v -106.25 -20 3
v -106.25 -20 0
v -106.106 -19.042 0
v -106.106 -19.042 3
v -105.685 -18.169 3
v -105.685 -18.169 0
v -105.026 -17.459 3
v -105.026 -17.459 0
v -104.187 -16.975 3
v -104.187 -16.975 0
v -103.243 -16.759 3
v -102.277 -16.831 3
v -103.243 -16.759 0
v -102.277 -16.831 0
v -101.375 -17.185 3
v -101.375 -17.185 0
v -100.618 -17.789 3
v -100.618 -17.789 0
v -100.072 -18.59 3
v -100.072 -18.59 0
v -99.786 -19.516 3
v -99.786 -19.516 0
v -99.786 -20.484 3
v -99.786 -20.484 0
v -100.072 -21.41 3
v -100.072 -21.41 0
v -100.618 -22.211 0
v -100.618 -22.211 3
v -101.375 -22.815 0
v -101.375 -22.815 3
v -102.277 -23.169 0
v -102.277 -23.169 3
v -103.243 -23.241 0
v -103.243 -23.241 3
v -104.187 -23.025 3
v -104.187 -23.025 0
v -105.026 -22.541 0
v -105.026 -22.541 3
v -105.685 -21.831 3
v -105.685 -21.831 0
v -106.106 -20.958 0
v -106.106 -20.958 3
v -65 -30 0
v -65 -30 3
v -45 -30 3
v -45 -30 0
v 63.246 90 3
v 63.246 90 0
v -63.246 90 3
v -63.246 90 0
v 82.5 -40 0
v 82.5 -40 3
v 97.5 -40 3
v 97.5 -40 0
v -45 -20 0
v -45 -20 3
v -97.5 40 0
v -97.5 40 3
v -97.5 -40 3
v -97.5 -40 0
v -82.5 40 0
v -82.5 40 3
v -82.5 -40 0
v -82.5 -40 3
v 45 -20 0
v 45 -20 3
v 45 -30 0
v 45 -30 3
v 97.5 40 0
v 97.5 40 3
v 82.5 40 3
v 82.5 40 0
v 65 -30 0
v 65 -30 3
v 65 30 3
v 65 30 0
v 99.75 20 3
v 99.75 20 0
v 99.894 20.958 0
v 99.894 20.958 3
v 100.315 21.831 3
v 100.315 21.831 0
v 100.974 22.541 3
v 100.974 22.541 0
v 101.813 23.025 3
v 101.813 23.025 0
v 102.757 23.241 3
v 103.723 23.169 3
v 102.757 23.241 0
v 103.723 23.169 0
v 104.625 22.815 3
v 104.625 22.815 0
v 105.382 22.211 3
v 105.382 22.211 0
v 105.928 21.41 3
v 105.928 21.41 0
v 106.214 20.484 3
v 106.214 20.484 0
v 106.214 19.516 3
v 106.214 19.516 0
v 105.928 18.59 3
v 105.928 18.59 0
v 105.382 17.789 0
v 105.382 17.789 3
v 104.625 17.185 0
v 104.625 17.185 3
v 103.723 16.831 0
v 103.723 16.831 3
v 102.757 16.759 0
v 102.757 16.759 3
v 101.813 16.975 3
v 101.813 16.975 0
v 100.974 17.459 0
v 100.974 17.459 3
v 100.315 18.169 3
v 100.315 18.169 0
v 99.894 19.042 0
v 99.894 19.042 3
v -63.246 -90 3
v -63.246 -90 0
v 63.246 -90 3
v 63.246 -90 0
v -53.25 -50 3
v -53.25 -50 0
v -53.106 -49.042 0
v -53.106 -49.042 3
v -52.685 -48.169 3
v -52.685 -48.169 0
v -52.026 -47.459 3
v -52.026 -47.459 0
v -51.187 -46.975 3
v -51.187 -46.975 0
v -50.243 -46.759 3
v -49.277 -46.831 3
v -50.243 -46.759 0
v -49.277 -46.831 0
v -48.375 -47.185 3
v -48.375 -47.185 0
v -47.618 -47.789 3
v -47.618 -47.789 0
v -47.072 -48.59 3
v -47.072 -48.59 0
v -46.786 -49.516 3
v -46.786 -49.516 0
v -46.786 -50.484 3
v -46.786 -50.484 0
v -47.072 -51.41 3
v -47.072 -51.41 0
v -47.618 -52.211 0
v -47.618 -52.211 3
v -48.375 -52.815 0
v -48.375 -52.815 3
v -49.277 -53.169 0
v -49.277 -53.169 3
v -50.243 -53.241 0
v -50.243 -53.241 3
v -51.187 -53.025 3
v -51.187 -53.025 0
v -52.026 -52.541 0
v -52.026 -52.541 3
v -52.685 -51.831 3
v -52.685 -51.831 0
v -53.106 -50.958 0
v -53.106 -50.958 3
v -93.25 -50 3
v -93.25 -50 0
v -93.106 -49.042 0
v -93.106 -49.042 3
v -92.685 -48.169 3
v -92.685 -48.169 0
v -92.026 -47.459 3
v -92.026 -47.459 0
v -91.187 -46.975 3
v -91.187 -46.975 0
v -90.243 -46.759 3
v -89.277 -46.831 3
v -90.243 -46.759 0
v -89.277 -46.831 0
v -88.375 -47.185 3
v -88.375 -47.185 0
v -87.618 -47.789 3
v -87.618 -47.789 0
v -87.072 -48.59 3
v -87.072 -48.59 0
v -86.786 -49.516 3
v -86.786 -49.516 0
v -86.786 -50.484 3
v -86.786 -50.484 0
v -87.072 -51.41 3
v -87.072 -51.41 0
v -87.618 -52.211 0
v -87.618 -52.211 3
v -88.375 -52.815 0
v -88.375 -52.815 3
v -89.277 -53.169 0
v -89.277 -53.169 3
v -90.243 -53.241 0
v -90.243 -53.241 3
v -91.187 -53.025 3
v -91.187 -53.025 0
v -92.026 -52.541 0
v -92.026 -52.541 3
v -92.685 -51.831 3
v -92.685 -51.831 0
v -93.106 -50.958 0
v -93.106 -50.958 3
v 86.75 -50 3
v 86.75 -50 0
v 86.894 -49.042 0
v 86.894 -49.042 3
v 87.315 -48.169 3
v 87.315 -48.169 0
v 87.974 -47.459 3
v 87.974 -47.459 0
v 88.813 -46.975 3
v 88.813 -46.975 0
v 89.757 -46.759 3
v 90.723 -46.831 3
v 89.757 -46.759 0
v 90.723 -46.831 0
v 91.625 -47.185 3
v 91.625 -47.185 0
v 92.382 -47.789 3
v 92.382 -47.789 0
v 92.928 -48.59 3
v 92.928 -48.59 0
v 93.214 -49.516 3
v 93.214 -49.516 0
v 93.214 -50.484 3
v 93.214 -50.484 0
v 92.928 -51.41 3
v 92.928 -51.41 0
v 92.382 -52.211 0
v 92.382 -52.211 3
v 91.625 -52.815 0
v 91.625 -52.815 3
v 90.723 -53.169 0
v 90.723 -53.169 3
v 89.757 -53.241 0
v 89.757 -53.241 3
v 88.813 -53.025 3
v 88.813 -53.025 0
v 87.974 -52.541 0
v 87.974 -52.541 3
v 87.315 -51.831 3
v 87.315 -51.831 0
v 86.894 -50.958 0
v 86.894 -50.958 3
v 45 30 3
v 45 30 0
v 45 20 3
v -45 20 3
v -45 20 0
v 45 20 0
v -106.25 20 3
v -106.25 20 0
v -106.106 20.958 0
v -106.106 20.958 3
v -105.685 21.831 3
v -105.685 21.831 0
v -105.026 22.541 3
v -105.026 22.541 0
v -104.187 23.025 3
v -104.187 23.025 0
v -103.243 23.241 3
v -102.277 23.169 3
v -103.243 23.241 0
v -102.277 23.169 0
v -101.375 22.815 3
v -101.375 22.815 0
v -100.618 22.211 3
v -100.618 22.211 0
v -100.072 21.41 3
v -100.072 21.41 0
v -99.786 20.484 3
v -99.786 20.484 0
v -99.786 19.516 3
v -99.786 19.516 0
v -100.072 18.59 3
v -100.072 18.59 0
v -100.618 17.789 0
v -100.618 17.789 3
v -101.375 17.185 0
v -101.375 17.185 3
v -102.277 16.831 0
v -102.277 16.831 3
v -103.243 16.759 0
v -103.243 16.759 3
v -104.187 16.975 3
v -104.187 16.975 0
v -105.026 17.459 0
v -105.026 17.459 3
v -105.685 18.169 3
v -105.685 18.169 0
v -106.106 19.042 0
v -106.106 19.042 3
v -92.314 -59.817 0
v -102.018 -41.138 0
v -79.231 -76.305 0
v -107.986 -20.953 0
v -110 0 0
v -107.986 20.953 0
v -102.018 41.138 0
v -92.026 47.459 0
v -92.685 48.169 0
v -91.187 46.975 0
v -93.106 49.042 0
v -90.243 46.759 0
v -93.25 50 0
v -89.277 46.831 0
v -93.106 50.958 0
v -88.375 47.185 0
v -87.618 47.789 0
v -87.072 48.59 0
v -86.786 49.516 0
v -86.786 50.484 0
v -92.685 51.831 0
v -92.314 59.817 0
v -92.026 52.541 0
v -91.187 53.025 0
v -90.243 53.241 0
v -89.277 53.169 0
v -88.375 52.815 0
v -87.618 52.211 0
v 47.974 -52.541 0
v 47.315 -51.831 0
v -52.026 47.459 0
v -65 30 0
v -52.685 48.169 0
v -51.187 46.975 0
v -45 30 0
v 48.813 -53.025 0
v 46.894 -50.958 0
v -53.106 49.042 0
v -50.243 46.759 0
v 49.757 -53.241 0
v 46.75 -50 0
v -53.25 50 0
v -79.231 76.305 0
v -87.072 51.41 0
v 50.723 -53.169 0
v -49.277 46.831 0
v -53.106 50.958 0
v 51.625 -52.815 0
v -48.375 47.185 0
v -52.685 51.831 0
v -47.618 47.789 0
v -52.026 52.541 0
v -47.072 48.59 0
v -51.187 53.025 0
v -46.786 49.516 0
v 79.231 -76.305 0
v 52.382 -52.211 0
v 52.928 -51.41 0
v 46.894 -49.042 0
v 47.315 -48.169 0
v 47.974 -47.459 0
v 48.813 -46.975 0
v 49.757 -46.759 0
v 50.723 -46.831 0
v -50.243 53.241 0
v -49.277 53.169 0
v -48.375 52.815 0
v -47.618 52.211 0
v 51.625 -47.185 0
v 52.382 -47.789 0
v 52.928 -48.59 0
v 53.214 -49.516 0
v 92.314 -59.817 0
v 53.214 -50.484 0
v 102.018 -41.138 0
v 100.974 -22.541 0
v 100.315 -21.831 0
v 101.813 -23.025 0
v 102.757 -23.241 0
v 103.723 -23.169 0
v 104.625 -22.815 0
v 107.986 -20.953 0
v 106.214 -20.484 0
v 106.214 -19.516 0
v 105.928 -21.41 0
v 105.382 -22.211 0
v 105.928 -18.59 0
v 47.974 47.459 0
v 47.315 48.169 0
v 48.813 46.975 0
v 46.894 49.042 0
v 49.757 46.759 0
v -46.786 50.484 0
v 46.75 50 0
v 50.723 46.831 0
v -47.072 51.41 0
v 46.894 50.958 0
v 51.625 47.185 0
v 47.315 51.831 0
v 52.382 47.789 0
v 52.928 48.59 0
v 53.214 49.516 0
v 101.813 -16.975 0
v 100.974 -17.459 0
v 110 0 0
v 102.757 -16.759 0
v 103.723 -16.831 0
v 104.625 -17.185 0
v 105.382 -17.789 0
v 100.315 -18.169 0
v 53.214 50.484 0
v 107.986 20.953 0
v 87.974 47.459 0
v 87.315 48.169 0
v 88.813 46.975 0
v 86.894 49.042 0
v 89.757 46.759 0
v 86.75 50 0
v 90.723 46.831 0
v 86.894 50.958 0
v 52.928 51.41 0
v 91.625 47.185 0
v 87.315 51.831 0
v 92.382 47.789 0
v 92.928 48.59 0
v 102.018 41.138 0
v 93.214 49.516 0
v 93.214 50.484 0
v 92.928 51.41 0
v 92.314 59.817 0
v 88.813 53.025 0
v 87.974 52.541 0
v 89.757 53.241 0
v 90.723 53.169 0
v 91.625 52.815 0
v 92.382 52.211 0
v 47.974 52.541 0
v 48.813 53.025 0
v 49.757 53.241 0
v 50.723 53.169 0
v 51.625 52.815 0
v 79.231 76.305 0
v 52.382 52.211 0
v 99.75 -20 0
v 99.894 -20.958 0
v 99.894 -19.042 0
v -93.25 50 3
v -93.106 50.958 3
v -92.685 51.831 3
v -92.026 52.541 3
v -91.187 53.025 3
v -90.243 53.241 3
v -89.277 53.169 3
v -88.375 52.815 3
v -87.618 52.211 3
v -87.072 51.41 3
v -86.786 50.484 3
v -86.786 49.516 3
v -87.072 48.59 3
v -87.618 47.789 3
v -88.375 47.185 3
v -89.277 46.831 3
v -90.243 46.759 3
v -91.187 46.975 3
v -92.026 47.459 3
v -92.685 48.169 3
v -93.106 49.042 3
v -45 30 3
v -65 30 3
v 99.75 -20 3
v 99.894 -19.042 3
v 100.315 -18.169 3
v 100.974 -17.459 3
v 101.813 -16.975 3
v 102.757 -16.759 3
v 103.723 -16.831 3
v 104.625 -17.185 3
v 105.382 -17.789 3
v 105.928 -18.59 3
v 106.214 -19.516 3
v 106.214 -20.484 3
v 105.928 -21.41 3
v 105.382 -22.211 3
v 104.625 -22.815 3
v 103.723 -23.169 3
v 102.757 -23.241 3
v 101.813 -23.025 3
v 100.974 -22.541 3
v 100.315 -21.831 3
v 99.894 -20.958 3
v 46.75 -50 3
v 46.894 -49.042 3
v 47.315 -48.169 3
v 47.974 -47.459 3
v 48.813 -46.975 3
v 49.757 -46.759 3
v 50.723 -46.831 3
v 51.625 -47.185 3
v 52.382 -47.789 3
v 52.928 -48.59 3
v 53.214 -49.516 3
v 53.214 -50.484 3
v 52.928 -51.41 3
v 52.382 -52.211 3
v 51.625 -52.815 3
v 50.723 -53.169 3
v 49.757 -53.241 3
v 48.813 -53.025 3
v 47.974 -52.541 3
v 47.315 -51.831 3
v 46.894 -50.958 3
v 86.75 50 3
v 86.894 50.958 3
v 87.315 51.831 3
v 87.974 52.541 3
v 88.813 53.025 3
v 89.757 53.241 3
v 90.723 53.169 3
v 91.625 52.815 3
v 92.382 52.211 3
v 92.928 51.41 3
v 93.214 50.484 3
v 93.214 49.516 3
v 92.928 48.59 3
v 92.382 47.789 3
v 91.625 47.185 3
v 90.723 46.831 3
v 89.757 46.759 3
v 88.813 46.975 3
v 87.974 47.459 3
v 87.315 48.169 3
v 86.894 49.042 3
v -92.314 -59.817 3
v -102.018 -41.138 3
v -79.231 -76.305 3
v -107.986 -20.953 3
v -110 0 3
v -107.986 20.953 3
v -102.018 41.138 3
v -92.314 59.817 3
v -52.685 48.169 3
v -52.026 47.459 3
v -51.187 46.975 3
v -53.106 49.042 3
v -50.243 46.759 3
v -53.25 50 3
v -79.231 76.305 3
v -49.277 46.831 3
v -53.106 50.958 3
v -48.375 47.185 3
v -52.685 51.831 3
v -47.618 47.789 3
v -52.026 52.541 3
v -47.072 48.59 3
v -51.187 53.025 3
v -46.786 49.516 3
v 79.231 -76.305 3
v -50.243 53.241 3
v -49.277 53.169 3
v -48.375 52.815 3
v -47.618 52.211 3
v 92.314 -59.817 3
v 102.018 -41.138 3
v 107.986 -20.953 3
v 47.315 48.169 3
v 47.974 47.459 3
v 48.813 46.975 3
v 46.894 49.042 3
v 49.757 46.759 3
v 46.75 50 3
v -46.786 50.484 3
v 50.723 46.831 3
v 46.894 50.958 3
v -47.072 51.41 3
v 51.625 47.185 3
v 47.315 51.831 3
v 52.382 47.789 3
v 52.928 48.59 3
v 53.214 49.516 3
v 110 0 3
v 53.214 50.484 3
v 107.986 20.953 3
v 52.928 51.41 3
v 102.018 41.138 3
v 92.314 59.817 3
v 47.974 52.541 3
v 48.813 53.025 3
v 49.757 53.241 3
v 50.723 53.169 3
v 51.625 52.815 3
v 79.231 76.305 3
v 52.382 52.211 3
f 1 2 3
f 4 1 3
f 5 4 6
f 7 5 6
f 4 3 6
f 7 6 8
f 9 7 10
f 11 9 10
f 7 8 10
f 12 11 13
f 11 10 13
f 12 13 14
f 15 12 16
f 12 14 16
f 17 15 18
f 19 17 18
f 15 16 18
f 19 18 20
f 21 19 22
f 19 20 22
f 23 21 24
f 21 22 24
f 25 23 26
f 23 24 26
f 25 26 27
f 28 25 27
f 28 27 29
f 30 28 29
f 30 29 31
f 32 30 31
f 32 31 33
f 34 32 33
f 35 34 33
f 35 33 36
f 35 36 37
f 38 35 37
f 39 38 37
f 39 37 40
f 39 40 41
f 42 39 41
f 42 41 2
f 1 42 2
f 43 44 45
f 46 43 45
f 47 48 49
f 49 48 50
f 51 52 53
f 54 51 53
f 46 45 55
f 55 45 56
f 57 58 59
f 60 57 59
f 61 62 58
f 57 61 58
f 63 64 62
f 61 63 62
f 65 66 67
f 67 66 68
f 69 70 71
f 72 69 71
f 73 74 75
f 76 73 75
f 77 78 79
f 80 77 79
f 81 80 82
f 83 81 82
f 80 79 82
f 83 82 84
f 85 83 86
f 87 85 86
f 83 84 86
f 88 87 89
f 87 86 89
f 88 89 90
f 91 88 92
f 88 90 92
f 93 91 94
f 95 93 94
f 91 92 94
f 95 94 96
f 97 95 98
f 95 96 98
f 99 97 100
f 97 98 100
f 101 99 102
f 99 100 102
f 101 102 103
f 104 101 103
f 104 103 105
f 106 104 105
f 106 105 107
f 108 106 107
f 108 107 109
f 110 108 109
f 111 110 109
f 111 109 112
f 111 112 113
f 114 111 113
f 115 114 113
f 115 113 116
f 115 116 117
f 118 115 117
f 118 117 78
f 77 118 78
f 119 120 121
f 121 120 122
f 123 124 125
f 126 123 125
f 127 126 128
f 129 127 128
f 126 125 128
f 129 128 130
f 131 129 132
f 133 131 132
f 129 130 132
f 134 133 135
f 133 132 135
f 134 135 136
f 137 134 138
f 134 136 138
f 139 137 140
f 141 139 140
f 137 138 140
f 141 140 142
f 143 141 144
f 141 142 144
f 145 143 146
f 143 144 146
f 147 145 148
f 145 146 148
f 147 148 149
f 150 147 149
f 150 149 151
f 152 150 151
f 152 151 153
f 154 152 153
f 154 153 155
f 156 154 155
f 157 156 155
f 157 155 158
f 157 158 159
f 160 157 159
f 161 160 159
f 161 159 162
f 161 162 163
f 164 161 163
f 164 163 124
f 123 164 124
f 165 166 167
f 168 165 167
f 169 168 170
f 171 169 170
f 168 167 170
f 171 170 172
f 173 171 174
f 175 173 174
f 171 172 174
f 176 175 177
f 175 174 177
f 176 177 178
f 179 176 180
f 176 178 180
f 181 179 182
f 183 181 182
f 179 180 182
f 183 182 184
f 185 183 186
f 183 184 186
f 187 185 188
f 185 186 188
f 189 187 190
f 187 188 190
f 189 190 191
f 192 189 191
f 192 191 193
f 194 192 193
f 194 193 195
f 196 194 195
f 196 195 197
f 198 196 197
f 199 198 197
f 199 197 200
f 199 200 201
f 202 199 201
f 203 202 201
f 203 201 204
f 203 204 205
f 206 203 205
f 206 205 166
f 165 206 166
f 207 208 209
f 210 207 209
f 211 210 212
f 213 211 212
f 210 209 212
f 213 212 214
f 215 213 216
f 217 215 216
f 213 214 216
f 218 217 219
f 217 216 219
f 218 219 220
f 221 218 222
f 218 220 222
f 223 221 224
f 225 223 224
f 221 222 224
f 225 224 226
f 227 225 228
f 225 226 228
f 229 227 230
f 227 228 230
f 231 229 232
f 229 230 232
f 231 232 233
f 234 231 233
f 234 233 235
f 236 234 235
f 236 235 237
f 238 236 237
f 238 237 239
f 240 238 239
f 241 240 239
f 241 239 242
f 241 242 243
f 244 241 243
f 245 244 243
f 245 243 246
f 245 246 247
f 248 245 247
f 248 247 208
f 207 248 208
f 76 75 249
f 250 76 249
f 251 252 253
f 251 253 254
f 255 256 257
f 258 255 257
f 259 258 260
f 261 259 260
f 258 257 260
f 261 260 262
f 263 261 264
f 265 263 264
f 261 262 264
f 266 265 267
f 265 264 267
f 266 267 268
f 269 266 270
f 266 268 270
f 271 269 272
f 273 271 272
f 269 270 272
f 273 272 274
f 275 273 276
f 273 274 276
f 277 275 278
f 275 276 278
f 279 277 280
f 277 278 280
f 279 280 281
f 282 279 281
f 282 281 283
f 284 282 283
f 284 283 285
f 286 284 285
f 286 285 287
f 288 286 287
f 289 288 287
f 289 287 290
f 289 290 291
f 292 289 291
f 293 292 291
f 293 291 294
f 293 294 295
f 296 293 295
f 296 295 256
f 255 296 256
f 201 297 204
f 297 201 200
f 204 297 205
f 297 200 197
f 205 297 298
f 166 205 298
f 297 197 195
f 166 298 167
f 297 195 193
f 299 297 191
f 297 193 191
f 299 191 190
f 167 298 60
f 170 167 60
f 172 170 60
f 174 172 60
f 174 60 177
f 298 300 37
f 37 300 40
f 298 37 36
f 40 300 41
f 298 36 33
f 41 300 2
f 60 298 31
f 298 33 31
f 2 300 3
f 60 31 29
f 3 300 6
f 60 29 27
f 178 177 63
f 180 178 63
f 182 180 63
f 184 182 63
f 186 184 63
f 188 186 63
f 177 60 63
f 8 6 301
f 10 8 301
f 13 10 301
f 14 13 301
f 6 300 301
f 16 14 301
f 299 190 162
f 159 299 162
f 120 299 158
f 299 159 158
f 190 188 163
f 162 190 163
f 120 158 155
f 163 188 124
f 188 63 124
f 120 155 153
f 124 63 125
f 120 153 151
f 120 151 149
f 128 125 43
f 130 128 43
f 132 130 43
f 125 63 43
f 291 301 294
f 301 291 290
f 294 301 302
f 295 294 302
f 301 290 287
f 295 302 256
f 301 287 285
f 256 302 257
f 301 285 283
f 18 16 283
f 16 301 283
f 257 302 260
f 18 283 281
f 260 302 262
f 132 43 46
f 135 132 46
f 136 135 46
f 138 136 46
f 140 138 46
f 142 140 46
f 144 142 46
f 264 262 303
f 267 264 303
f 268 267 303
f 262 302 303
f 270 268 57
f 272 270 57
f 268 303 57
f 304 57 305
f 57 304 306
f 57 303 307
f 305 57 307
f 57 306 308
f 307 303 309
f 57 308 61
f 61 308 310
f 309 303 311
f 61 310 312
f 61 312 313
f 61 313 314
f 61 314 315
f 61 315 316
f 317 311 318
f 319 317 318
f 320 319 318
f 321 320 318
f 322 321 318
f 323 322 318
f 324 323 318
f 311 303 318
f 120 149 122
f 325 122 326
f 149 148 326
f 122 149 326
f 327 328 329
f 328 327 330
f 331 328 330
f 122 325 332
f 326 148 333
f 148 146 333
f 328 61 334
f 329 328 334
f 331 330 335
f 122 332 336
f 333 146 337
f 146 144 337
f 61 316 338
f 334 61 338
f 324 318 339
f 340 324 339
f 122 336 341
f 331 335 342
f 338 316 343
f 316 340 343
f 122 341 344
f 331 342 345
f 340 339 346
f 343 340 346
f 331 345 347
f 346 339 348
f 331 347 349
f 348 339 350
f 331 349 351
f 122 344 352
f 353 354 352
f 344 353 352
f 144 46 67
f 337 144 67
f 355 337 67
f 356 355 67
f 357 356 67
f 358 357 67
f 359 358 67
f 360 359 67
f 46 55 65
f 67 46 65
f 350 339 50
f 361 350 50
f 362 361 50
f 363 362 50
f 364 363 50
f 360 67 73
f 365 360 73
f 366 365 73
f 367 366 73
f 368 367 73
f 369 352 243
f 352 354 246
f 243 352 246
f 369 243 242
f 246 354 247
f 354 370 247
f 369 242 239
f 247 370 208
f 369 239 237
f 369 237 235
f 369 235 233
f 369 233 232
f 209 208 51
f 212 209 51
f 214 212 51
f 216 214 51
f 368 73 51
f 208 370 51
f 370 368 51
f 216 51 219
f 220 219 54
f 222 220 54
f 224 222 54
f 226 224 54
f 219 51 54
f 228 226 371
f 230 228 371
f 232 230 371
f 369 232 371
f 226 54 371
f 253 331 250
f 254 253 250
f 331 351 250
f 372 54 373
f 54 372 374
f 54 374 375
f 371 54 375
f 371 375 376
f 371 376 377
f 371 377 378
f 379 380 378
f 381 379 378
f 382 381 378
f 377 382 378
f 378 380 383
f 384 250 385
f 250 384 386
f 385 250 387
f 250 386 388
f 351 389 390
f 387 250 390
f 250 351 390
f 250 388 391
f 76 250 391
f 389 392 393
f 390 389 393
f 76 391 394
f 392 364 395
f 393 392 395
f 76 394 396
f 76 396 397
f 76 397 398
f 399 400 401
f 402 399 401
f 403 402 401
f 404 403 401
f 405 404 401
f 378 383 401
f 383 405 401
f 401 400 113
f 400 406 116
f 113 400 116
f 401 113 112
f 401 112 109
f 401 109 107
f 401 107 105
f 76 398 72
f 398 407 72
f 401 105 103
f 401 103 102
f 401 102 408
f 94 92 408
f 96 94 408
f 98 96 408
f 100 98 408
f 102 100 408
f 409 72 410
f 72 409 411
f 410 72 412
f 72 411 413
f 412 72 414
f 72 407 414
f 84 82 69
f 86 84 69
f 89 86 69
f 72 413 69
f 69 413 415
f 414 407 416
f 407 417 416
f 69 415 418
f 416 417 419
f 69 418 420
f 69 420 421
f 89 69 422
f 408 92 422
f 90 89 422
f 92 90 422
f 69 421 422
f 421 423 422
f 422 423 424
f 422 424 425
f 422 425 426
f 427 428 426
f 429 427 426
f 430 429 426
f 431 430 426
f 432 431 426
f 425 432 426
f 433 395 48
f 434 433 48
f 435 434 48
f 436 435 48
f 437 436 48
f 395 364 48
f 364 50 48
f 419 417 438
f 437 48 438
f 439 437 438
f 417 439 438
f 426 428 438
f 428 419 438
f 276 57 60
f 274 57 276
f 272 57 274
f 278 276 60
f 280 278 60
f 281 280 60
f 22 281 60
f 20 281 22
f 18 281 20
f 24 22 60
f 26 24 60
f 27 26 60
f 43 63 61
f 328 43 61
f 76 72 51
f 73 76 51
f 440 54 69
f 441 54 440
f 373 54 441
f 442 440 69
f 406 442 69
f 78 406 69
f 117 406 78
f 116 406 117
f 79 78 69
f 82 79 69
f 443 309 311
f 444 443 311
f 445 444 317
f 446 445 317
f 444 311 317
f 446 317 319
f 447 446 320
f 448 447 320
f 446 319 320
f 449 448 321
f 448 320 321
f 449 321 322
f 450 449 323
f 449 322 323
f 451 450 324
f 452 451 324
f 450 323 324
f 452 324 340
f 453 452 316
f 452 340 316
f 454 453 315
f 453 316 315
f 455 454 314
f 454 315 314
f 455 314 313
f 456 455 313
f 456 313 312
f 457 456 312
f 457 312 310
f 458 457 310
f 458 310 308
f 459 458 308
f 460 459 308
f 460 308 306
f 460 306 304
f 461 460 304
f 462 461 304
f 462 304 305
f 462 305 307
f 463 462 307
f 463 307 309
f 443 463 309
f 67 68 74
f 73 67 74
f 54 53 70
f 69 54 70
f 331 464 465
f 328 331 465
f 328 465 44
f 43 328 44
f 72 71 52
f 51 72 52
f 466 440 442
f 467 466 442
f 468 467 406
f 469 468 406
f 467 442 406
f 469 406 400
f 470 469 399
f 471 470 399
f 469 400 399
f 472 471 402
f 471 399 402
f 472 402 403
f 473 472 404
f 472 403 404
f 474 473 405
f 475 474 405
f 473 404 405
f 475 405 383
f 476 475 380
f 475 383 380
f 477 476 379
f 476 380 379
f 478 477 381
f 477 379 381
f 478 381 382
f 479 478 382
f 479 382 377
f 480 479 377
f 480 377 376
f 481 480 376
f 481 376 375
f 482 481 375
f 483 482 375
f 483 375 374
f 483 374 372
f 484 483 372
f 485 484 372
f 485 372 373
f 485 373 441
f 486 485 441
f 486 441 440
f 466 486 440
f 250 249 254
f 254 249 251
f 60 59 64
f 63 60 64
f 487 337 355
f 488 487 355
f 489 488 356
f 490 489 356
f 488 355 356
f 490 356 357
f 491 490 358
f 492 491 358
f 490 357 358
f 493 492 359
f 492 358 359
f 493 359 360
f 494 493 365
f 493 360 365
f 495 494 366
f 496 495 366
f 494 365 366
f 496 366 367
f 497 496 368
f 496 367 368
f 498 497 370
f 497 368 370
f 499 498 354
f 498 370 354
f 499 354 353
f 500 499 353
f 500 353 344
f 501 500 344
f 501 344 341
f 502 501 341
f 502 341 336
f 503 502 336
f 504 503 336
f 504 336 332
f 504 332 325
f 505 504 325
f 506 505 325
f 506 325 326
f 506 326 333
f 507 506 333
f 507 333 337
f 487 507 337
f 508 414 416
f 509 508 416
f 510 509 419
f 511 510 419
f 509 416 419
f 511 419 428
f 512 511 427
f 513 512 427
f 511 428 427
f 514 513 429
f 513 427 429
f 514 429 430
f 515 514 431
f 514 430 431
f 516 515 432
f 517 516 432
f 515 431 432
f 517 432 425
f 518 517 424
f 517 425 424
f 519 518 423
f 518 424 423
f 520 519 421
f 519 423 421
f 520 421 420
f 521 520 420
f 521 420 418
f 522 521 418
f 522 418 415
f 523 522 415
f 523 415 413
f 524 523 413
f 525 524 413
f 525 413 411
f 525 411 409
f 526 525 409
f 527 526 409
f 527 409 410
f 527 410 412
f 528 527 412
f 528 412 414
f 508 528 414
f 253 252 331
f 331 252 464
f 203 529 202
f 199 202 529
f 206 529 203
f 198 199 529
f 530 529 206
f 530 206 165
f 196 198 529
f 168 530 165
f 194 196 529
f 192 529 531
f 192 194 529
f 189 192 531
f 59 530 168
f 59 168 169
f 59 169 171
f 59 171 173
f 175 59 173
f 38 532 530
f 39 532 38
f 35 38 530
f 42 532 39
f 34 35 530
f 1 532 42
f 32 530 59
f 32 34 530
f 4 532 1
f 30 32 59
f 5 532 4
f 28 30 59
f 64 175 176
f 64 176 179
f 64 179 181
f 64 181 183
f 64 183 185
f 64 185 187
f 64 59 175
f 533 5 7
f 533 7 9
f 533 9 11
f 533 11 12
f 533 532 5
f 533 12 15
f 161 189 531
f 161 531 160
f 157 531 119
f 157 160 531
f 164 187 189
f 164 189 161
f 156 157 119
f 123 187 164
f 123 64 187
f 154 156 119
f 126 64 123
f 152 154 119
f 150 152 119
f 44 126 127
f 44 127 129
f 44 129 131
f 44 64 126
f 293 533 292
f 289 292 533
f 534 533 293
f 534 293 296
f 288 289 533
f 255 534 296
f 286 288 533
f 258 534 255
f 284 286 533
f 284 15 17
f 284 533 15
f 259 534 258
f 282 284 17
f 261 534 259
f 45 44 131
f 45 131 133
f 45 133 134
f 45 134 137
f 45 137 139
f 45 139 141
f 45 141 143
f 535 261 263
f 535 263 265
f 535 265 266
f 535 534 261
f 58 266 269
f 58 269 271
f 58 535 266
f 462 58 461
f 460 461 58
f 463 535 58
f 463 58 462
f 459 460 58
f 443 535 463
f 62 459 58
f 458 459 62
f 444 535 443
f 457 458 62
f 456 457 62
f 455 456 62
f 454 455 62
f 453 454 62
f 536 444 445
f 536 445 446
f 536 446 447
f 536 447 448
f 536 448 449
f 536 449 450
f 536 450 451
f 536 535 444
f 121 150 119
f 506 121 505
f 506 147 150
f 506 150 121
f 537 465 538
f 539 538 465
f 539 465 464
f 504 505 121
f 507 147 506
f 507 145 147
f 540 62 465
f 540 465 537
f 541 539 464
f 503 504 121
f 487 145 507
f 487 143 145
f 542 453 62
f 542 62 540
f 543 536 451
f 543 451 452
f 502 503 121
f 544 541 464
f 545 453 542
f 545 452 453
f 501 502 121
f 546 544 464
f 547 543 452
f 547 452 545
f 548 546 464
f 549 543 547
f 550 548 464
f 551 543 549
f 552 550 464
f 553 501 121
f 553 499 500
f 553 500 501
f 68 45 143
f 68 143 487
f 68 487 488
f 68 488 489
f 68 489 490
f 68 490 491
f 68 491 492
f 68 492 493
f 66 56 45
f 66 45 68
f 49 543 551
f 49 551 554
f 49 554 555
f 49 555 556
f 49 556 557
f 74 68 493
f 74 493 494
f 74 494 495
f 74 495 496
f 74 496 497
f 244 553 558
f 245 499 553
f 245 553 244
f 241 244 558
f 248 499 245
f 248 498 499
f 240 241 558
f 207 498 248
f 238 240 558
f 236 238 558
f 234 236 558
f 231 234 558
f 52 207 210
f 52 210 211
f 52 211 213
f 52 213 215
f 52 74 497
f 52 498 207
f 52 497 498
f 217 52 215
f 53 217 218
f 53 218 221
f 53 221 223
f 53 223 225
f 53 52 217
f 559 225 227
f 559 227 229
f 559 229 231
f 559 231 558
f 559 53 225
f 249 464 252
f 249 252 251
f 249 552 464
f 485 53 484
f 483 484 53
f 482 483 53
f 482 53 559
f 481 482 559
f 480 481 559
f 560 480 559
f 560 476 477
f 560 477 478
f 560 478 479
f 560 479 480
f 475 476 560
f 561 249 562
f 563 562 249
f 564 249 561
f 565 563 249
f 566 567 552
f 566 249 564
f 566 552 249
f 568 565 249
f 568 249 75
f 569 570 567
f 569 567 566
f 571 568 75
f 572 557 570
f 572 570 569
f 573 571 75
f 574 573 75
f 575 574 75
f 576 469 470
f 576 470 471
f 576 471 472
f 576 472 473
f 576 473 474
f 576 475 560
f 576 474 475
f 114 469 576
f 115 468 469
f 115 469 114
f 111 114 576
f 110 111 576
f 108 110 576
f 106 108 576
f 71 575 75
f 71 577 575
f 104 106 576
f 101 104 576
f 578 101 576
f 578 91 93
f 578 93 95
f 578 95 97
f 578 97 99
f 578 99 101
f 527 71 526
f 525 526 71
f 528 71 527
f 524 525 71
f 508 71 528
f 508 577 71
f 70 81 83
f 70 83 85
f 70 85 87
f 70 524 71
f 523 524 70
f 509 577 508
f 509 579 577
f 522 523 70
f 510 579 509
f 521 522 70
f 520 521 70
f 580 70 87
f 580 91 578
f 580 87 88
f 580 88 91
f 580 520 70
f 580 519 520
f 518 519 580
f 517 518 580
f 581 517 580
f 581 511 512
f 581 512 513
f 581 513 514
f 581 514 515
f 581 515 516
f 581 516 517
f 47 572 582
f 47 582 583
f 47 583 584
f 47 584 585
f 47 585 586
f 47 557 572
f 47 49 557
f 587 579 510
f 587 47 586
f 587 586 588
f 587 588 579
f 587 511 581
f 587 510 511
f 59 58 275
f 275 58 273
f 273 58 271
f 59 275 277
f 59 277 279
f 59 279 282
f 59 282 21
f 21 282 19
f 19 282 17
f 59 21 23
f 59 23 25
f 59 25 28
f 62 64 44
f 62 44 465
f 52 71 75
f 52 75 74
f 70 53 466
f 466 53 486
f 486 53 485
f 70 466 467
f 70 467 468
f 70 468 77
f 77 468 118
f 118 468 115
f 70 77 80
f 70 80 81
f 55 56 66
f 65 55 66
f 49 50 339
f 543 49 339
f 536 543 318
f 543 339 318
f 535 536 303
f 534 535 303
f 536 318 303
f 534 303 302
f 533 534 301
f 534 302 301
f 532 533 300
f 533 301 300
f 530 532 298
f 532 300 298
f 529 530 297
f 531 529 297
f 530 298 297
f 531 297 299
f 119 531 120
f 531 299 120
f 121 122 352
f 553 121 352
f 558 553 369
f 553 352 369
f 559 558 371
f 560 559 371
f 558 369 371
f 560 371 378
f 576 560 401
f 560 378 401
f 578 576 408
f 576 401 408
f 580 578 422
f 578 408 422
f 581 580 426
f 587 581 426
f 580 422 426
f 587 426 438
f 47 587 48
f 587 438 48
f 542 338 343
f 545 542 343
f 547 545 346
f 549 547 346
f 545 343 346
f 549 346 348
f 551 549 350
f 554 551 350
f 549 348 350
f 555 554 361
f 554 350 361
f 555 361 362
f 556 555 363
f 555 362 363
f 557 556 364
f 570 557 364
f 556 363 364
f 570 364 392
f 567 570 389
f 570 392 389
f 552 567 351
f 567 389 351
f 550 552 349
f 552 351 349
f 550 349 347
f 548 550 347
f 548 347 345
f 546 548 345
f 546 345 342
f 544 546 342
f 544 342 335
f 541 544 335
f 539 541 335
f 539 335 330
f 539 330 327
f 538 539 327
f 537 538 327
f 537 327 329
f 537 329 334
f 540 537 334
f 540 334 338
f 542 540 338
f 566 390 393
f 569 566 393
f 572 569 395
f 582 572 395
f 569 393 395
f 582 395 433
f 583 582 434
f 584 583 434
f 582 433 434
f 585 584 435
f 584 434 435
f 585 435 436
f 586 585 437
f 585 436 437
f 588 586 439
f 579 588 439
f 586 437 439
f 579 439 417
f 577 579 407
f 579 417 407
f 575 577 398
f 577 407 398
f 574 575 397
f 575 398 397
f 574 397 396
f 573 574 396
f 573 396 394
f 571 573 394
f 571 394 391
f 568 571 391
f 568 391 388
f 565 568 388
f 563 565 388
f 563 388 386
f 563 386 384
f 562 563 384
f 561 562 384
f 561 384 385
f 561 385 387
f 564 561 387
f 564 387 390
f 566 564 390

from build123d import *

# Parameters (mm, degrees)
F1_DEPTH = 3
F3_D     = 6.5
F5_D     = 6.5
F6_W     = 90
F6_H     = 40
F7_DEPTH = 3.001
F9_DEPTH = 3.001


# Not quite as in the source:
# - a feature names something its author has since deleted; it is built from what else it names


with BuildPart() as f1:
    # F0 (on Top) → F1 (new body)
    with BuildSketch(Plane.XY):
        with BuildLine():
            Line((63.2455532034, 90), (-63.2455532034, 90))
            ThreePointArc((-63.2455532034, 90), (-110, 0), (-63.2455532034, -90))
            Line((-63.2455532034, -90), (63.2455532034, -90))
            ThreePointArc((63.2455532034, -90), (110, 0), (63.2455532034, 90))
        make_face()
    extrude(amount=F1_DEPTH)

    # F3 (through all)
    with Locations(Plane.XY.offset(3)):
        with Locations((-103, 20), (-103, -20), (-90, 50), (-90, -50), (90, -50), (90, 50), (103, 20), (103, -20)):
            Hole(F3_D / 2)

    # F5 (through all)
    with Locations(Plane.XY.offset(3)):
        with Locations((-50, 50), (50, 50), (50, -50), (-50, -50)):
            Hole(F5_D / 2)

    # F6 (on face) → F7 (cut, through all)
    with BuildSketch(Plane.XY.offset(3)):
        Polygon((-45, -20), (-45, 20), (-45, 30), (-65, 30), (-65, -30), (-45, -30), align=None)
        Rectangle(F6_W, F6_H)
        Polygon((45, 30), (45, 20), (45, -20), (45, -30), (65, -30), (65, 30), align=None)
    extrude(amount=-F7_DEPTH, mode=Mode.SUBTRACT)

    # F8 (on face) → F9 (cut, through all)
    with BuildSketch(Plane.XY.offset(3)):
        Polygon((-90, 40), (-97.5, 40), (-97.5, -40), (-82.5, -40), (-82.5, 40), align=None)
        Polygon((90, 40), (82.5, 40), (82.5, -40), (97.5, -40), (97.5, 40), align=None)
    extrude(amount=-F9_DEPTH, mode=Mode.SUBTRACT)


solid = f1.part
